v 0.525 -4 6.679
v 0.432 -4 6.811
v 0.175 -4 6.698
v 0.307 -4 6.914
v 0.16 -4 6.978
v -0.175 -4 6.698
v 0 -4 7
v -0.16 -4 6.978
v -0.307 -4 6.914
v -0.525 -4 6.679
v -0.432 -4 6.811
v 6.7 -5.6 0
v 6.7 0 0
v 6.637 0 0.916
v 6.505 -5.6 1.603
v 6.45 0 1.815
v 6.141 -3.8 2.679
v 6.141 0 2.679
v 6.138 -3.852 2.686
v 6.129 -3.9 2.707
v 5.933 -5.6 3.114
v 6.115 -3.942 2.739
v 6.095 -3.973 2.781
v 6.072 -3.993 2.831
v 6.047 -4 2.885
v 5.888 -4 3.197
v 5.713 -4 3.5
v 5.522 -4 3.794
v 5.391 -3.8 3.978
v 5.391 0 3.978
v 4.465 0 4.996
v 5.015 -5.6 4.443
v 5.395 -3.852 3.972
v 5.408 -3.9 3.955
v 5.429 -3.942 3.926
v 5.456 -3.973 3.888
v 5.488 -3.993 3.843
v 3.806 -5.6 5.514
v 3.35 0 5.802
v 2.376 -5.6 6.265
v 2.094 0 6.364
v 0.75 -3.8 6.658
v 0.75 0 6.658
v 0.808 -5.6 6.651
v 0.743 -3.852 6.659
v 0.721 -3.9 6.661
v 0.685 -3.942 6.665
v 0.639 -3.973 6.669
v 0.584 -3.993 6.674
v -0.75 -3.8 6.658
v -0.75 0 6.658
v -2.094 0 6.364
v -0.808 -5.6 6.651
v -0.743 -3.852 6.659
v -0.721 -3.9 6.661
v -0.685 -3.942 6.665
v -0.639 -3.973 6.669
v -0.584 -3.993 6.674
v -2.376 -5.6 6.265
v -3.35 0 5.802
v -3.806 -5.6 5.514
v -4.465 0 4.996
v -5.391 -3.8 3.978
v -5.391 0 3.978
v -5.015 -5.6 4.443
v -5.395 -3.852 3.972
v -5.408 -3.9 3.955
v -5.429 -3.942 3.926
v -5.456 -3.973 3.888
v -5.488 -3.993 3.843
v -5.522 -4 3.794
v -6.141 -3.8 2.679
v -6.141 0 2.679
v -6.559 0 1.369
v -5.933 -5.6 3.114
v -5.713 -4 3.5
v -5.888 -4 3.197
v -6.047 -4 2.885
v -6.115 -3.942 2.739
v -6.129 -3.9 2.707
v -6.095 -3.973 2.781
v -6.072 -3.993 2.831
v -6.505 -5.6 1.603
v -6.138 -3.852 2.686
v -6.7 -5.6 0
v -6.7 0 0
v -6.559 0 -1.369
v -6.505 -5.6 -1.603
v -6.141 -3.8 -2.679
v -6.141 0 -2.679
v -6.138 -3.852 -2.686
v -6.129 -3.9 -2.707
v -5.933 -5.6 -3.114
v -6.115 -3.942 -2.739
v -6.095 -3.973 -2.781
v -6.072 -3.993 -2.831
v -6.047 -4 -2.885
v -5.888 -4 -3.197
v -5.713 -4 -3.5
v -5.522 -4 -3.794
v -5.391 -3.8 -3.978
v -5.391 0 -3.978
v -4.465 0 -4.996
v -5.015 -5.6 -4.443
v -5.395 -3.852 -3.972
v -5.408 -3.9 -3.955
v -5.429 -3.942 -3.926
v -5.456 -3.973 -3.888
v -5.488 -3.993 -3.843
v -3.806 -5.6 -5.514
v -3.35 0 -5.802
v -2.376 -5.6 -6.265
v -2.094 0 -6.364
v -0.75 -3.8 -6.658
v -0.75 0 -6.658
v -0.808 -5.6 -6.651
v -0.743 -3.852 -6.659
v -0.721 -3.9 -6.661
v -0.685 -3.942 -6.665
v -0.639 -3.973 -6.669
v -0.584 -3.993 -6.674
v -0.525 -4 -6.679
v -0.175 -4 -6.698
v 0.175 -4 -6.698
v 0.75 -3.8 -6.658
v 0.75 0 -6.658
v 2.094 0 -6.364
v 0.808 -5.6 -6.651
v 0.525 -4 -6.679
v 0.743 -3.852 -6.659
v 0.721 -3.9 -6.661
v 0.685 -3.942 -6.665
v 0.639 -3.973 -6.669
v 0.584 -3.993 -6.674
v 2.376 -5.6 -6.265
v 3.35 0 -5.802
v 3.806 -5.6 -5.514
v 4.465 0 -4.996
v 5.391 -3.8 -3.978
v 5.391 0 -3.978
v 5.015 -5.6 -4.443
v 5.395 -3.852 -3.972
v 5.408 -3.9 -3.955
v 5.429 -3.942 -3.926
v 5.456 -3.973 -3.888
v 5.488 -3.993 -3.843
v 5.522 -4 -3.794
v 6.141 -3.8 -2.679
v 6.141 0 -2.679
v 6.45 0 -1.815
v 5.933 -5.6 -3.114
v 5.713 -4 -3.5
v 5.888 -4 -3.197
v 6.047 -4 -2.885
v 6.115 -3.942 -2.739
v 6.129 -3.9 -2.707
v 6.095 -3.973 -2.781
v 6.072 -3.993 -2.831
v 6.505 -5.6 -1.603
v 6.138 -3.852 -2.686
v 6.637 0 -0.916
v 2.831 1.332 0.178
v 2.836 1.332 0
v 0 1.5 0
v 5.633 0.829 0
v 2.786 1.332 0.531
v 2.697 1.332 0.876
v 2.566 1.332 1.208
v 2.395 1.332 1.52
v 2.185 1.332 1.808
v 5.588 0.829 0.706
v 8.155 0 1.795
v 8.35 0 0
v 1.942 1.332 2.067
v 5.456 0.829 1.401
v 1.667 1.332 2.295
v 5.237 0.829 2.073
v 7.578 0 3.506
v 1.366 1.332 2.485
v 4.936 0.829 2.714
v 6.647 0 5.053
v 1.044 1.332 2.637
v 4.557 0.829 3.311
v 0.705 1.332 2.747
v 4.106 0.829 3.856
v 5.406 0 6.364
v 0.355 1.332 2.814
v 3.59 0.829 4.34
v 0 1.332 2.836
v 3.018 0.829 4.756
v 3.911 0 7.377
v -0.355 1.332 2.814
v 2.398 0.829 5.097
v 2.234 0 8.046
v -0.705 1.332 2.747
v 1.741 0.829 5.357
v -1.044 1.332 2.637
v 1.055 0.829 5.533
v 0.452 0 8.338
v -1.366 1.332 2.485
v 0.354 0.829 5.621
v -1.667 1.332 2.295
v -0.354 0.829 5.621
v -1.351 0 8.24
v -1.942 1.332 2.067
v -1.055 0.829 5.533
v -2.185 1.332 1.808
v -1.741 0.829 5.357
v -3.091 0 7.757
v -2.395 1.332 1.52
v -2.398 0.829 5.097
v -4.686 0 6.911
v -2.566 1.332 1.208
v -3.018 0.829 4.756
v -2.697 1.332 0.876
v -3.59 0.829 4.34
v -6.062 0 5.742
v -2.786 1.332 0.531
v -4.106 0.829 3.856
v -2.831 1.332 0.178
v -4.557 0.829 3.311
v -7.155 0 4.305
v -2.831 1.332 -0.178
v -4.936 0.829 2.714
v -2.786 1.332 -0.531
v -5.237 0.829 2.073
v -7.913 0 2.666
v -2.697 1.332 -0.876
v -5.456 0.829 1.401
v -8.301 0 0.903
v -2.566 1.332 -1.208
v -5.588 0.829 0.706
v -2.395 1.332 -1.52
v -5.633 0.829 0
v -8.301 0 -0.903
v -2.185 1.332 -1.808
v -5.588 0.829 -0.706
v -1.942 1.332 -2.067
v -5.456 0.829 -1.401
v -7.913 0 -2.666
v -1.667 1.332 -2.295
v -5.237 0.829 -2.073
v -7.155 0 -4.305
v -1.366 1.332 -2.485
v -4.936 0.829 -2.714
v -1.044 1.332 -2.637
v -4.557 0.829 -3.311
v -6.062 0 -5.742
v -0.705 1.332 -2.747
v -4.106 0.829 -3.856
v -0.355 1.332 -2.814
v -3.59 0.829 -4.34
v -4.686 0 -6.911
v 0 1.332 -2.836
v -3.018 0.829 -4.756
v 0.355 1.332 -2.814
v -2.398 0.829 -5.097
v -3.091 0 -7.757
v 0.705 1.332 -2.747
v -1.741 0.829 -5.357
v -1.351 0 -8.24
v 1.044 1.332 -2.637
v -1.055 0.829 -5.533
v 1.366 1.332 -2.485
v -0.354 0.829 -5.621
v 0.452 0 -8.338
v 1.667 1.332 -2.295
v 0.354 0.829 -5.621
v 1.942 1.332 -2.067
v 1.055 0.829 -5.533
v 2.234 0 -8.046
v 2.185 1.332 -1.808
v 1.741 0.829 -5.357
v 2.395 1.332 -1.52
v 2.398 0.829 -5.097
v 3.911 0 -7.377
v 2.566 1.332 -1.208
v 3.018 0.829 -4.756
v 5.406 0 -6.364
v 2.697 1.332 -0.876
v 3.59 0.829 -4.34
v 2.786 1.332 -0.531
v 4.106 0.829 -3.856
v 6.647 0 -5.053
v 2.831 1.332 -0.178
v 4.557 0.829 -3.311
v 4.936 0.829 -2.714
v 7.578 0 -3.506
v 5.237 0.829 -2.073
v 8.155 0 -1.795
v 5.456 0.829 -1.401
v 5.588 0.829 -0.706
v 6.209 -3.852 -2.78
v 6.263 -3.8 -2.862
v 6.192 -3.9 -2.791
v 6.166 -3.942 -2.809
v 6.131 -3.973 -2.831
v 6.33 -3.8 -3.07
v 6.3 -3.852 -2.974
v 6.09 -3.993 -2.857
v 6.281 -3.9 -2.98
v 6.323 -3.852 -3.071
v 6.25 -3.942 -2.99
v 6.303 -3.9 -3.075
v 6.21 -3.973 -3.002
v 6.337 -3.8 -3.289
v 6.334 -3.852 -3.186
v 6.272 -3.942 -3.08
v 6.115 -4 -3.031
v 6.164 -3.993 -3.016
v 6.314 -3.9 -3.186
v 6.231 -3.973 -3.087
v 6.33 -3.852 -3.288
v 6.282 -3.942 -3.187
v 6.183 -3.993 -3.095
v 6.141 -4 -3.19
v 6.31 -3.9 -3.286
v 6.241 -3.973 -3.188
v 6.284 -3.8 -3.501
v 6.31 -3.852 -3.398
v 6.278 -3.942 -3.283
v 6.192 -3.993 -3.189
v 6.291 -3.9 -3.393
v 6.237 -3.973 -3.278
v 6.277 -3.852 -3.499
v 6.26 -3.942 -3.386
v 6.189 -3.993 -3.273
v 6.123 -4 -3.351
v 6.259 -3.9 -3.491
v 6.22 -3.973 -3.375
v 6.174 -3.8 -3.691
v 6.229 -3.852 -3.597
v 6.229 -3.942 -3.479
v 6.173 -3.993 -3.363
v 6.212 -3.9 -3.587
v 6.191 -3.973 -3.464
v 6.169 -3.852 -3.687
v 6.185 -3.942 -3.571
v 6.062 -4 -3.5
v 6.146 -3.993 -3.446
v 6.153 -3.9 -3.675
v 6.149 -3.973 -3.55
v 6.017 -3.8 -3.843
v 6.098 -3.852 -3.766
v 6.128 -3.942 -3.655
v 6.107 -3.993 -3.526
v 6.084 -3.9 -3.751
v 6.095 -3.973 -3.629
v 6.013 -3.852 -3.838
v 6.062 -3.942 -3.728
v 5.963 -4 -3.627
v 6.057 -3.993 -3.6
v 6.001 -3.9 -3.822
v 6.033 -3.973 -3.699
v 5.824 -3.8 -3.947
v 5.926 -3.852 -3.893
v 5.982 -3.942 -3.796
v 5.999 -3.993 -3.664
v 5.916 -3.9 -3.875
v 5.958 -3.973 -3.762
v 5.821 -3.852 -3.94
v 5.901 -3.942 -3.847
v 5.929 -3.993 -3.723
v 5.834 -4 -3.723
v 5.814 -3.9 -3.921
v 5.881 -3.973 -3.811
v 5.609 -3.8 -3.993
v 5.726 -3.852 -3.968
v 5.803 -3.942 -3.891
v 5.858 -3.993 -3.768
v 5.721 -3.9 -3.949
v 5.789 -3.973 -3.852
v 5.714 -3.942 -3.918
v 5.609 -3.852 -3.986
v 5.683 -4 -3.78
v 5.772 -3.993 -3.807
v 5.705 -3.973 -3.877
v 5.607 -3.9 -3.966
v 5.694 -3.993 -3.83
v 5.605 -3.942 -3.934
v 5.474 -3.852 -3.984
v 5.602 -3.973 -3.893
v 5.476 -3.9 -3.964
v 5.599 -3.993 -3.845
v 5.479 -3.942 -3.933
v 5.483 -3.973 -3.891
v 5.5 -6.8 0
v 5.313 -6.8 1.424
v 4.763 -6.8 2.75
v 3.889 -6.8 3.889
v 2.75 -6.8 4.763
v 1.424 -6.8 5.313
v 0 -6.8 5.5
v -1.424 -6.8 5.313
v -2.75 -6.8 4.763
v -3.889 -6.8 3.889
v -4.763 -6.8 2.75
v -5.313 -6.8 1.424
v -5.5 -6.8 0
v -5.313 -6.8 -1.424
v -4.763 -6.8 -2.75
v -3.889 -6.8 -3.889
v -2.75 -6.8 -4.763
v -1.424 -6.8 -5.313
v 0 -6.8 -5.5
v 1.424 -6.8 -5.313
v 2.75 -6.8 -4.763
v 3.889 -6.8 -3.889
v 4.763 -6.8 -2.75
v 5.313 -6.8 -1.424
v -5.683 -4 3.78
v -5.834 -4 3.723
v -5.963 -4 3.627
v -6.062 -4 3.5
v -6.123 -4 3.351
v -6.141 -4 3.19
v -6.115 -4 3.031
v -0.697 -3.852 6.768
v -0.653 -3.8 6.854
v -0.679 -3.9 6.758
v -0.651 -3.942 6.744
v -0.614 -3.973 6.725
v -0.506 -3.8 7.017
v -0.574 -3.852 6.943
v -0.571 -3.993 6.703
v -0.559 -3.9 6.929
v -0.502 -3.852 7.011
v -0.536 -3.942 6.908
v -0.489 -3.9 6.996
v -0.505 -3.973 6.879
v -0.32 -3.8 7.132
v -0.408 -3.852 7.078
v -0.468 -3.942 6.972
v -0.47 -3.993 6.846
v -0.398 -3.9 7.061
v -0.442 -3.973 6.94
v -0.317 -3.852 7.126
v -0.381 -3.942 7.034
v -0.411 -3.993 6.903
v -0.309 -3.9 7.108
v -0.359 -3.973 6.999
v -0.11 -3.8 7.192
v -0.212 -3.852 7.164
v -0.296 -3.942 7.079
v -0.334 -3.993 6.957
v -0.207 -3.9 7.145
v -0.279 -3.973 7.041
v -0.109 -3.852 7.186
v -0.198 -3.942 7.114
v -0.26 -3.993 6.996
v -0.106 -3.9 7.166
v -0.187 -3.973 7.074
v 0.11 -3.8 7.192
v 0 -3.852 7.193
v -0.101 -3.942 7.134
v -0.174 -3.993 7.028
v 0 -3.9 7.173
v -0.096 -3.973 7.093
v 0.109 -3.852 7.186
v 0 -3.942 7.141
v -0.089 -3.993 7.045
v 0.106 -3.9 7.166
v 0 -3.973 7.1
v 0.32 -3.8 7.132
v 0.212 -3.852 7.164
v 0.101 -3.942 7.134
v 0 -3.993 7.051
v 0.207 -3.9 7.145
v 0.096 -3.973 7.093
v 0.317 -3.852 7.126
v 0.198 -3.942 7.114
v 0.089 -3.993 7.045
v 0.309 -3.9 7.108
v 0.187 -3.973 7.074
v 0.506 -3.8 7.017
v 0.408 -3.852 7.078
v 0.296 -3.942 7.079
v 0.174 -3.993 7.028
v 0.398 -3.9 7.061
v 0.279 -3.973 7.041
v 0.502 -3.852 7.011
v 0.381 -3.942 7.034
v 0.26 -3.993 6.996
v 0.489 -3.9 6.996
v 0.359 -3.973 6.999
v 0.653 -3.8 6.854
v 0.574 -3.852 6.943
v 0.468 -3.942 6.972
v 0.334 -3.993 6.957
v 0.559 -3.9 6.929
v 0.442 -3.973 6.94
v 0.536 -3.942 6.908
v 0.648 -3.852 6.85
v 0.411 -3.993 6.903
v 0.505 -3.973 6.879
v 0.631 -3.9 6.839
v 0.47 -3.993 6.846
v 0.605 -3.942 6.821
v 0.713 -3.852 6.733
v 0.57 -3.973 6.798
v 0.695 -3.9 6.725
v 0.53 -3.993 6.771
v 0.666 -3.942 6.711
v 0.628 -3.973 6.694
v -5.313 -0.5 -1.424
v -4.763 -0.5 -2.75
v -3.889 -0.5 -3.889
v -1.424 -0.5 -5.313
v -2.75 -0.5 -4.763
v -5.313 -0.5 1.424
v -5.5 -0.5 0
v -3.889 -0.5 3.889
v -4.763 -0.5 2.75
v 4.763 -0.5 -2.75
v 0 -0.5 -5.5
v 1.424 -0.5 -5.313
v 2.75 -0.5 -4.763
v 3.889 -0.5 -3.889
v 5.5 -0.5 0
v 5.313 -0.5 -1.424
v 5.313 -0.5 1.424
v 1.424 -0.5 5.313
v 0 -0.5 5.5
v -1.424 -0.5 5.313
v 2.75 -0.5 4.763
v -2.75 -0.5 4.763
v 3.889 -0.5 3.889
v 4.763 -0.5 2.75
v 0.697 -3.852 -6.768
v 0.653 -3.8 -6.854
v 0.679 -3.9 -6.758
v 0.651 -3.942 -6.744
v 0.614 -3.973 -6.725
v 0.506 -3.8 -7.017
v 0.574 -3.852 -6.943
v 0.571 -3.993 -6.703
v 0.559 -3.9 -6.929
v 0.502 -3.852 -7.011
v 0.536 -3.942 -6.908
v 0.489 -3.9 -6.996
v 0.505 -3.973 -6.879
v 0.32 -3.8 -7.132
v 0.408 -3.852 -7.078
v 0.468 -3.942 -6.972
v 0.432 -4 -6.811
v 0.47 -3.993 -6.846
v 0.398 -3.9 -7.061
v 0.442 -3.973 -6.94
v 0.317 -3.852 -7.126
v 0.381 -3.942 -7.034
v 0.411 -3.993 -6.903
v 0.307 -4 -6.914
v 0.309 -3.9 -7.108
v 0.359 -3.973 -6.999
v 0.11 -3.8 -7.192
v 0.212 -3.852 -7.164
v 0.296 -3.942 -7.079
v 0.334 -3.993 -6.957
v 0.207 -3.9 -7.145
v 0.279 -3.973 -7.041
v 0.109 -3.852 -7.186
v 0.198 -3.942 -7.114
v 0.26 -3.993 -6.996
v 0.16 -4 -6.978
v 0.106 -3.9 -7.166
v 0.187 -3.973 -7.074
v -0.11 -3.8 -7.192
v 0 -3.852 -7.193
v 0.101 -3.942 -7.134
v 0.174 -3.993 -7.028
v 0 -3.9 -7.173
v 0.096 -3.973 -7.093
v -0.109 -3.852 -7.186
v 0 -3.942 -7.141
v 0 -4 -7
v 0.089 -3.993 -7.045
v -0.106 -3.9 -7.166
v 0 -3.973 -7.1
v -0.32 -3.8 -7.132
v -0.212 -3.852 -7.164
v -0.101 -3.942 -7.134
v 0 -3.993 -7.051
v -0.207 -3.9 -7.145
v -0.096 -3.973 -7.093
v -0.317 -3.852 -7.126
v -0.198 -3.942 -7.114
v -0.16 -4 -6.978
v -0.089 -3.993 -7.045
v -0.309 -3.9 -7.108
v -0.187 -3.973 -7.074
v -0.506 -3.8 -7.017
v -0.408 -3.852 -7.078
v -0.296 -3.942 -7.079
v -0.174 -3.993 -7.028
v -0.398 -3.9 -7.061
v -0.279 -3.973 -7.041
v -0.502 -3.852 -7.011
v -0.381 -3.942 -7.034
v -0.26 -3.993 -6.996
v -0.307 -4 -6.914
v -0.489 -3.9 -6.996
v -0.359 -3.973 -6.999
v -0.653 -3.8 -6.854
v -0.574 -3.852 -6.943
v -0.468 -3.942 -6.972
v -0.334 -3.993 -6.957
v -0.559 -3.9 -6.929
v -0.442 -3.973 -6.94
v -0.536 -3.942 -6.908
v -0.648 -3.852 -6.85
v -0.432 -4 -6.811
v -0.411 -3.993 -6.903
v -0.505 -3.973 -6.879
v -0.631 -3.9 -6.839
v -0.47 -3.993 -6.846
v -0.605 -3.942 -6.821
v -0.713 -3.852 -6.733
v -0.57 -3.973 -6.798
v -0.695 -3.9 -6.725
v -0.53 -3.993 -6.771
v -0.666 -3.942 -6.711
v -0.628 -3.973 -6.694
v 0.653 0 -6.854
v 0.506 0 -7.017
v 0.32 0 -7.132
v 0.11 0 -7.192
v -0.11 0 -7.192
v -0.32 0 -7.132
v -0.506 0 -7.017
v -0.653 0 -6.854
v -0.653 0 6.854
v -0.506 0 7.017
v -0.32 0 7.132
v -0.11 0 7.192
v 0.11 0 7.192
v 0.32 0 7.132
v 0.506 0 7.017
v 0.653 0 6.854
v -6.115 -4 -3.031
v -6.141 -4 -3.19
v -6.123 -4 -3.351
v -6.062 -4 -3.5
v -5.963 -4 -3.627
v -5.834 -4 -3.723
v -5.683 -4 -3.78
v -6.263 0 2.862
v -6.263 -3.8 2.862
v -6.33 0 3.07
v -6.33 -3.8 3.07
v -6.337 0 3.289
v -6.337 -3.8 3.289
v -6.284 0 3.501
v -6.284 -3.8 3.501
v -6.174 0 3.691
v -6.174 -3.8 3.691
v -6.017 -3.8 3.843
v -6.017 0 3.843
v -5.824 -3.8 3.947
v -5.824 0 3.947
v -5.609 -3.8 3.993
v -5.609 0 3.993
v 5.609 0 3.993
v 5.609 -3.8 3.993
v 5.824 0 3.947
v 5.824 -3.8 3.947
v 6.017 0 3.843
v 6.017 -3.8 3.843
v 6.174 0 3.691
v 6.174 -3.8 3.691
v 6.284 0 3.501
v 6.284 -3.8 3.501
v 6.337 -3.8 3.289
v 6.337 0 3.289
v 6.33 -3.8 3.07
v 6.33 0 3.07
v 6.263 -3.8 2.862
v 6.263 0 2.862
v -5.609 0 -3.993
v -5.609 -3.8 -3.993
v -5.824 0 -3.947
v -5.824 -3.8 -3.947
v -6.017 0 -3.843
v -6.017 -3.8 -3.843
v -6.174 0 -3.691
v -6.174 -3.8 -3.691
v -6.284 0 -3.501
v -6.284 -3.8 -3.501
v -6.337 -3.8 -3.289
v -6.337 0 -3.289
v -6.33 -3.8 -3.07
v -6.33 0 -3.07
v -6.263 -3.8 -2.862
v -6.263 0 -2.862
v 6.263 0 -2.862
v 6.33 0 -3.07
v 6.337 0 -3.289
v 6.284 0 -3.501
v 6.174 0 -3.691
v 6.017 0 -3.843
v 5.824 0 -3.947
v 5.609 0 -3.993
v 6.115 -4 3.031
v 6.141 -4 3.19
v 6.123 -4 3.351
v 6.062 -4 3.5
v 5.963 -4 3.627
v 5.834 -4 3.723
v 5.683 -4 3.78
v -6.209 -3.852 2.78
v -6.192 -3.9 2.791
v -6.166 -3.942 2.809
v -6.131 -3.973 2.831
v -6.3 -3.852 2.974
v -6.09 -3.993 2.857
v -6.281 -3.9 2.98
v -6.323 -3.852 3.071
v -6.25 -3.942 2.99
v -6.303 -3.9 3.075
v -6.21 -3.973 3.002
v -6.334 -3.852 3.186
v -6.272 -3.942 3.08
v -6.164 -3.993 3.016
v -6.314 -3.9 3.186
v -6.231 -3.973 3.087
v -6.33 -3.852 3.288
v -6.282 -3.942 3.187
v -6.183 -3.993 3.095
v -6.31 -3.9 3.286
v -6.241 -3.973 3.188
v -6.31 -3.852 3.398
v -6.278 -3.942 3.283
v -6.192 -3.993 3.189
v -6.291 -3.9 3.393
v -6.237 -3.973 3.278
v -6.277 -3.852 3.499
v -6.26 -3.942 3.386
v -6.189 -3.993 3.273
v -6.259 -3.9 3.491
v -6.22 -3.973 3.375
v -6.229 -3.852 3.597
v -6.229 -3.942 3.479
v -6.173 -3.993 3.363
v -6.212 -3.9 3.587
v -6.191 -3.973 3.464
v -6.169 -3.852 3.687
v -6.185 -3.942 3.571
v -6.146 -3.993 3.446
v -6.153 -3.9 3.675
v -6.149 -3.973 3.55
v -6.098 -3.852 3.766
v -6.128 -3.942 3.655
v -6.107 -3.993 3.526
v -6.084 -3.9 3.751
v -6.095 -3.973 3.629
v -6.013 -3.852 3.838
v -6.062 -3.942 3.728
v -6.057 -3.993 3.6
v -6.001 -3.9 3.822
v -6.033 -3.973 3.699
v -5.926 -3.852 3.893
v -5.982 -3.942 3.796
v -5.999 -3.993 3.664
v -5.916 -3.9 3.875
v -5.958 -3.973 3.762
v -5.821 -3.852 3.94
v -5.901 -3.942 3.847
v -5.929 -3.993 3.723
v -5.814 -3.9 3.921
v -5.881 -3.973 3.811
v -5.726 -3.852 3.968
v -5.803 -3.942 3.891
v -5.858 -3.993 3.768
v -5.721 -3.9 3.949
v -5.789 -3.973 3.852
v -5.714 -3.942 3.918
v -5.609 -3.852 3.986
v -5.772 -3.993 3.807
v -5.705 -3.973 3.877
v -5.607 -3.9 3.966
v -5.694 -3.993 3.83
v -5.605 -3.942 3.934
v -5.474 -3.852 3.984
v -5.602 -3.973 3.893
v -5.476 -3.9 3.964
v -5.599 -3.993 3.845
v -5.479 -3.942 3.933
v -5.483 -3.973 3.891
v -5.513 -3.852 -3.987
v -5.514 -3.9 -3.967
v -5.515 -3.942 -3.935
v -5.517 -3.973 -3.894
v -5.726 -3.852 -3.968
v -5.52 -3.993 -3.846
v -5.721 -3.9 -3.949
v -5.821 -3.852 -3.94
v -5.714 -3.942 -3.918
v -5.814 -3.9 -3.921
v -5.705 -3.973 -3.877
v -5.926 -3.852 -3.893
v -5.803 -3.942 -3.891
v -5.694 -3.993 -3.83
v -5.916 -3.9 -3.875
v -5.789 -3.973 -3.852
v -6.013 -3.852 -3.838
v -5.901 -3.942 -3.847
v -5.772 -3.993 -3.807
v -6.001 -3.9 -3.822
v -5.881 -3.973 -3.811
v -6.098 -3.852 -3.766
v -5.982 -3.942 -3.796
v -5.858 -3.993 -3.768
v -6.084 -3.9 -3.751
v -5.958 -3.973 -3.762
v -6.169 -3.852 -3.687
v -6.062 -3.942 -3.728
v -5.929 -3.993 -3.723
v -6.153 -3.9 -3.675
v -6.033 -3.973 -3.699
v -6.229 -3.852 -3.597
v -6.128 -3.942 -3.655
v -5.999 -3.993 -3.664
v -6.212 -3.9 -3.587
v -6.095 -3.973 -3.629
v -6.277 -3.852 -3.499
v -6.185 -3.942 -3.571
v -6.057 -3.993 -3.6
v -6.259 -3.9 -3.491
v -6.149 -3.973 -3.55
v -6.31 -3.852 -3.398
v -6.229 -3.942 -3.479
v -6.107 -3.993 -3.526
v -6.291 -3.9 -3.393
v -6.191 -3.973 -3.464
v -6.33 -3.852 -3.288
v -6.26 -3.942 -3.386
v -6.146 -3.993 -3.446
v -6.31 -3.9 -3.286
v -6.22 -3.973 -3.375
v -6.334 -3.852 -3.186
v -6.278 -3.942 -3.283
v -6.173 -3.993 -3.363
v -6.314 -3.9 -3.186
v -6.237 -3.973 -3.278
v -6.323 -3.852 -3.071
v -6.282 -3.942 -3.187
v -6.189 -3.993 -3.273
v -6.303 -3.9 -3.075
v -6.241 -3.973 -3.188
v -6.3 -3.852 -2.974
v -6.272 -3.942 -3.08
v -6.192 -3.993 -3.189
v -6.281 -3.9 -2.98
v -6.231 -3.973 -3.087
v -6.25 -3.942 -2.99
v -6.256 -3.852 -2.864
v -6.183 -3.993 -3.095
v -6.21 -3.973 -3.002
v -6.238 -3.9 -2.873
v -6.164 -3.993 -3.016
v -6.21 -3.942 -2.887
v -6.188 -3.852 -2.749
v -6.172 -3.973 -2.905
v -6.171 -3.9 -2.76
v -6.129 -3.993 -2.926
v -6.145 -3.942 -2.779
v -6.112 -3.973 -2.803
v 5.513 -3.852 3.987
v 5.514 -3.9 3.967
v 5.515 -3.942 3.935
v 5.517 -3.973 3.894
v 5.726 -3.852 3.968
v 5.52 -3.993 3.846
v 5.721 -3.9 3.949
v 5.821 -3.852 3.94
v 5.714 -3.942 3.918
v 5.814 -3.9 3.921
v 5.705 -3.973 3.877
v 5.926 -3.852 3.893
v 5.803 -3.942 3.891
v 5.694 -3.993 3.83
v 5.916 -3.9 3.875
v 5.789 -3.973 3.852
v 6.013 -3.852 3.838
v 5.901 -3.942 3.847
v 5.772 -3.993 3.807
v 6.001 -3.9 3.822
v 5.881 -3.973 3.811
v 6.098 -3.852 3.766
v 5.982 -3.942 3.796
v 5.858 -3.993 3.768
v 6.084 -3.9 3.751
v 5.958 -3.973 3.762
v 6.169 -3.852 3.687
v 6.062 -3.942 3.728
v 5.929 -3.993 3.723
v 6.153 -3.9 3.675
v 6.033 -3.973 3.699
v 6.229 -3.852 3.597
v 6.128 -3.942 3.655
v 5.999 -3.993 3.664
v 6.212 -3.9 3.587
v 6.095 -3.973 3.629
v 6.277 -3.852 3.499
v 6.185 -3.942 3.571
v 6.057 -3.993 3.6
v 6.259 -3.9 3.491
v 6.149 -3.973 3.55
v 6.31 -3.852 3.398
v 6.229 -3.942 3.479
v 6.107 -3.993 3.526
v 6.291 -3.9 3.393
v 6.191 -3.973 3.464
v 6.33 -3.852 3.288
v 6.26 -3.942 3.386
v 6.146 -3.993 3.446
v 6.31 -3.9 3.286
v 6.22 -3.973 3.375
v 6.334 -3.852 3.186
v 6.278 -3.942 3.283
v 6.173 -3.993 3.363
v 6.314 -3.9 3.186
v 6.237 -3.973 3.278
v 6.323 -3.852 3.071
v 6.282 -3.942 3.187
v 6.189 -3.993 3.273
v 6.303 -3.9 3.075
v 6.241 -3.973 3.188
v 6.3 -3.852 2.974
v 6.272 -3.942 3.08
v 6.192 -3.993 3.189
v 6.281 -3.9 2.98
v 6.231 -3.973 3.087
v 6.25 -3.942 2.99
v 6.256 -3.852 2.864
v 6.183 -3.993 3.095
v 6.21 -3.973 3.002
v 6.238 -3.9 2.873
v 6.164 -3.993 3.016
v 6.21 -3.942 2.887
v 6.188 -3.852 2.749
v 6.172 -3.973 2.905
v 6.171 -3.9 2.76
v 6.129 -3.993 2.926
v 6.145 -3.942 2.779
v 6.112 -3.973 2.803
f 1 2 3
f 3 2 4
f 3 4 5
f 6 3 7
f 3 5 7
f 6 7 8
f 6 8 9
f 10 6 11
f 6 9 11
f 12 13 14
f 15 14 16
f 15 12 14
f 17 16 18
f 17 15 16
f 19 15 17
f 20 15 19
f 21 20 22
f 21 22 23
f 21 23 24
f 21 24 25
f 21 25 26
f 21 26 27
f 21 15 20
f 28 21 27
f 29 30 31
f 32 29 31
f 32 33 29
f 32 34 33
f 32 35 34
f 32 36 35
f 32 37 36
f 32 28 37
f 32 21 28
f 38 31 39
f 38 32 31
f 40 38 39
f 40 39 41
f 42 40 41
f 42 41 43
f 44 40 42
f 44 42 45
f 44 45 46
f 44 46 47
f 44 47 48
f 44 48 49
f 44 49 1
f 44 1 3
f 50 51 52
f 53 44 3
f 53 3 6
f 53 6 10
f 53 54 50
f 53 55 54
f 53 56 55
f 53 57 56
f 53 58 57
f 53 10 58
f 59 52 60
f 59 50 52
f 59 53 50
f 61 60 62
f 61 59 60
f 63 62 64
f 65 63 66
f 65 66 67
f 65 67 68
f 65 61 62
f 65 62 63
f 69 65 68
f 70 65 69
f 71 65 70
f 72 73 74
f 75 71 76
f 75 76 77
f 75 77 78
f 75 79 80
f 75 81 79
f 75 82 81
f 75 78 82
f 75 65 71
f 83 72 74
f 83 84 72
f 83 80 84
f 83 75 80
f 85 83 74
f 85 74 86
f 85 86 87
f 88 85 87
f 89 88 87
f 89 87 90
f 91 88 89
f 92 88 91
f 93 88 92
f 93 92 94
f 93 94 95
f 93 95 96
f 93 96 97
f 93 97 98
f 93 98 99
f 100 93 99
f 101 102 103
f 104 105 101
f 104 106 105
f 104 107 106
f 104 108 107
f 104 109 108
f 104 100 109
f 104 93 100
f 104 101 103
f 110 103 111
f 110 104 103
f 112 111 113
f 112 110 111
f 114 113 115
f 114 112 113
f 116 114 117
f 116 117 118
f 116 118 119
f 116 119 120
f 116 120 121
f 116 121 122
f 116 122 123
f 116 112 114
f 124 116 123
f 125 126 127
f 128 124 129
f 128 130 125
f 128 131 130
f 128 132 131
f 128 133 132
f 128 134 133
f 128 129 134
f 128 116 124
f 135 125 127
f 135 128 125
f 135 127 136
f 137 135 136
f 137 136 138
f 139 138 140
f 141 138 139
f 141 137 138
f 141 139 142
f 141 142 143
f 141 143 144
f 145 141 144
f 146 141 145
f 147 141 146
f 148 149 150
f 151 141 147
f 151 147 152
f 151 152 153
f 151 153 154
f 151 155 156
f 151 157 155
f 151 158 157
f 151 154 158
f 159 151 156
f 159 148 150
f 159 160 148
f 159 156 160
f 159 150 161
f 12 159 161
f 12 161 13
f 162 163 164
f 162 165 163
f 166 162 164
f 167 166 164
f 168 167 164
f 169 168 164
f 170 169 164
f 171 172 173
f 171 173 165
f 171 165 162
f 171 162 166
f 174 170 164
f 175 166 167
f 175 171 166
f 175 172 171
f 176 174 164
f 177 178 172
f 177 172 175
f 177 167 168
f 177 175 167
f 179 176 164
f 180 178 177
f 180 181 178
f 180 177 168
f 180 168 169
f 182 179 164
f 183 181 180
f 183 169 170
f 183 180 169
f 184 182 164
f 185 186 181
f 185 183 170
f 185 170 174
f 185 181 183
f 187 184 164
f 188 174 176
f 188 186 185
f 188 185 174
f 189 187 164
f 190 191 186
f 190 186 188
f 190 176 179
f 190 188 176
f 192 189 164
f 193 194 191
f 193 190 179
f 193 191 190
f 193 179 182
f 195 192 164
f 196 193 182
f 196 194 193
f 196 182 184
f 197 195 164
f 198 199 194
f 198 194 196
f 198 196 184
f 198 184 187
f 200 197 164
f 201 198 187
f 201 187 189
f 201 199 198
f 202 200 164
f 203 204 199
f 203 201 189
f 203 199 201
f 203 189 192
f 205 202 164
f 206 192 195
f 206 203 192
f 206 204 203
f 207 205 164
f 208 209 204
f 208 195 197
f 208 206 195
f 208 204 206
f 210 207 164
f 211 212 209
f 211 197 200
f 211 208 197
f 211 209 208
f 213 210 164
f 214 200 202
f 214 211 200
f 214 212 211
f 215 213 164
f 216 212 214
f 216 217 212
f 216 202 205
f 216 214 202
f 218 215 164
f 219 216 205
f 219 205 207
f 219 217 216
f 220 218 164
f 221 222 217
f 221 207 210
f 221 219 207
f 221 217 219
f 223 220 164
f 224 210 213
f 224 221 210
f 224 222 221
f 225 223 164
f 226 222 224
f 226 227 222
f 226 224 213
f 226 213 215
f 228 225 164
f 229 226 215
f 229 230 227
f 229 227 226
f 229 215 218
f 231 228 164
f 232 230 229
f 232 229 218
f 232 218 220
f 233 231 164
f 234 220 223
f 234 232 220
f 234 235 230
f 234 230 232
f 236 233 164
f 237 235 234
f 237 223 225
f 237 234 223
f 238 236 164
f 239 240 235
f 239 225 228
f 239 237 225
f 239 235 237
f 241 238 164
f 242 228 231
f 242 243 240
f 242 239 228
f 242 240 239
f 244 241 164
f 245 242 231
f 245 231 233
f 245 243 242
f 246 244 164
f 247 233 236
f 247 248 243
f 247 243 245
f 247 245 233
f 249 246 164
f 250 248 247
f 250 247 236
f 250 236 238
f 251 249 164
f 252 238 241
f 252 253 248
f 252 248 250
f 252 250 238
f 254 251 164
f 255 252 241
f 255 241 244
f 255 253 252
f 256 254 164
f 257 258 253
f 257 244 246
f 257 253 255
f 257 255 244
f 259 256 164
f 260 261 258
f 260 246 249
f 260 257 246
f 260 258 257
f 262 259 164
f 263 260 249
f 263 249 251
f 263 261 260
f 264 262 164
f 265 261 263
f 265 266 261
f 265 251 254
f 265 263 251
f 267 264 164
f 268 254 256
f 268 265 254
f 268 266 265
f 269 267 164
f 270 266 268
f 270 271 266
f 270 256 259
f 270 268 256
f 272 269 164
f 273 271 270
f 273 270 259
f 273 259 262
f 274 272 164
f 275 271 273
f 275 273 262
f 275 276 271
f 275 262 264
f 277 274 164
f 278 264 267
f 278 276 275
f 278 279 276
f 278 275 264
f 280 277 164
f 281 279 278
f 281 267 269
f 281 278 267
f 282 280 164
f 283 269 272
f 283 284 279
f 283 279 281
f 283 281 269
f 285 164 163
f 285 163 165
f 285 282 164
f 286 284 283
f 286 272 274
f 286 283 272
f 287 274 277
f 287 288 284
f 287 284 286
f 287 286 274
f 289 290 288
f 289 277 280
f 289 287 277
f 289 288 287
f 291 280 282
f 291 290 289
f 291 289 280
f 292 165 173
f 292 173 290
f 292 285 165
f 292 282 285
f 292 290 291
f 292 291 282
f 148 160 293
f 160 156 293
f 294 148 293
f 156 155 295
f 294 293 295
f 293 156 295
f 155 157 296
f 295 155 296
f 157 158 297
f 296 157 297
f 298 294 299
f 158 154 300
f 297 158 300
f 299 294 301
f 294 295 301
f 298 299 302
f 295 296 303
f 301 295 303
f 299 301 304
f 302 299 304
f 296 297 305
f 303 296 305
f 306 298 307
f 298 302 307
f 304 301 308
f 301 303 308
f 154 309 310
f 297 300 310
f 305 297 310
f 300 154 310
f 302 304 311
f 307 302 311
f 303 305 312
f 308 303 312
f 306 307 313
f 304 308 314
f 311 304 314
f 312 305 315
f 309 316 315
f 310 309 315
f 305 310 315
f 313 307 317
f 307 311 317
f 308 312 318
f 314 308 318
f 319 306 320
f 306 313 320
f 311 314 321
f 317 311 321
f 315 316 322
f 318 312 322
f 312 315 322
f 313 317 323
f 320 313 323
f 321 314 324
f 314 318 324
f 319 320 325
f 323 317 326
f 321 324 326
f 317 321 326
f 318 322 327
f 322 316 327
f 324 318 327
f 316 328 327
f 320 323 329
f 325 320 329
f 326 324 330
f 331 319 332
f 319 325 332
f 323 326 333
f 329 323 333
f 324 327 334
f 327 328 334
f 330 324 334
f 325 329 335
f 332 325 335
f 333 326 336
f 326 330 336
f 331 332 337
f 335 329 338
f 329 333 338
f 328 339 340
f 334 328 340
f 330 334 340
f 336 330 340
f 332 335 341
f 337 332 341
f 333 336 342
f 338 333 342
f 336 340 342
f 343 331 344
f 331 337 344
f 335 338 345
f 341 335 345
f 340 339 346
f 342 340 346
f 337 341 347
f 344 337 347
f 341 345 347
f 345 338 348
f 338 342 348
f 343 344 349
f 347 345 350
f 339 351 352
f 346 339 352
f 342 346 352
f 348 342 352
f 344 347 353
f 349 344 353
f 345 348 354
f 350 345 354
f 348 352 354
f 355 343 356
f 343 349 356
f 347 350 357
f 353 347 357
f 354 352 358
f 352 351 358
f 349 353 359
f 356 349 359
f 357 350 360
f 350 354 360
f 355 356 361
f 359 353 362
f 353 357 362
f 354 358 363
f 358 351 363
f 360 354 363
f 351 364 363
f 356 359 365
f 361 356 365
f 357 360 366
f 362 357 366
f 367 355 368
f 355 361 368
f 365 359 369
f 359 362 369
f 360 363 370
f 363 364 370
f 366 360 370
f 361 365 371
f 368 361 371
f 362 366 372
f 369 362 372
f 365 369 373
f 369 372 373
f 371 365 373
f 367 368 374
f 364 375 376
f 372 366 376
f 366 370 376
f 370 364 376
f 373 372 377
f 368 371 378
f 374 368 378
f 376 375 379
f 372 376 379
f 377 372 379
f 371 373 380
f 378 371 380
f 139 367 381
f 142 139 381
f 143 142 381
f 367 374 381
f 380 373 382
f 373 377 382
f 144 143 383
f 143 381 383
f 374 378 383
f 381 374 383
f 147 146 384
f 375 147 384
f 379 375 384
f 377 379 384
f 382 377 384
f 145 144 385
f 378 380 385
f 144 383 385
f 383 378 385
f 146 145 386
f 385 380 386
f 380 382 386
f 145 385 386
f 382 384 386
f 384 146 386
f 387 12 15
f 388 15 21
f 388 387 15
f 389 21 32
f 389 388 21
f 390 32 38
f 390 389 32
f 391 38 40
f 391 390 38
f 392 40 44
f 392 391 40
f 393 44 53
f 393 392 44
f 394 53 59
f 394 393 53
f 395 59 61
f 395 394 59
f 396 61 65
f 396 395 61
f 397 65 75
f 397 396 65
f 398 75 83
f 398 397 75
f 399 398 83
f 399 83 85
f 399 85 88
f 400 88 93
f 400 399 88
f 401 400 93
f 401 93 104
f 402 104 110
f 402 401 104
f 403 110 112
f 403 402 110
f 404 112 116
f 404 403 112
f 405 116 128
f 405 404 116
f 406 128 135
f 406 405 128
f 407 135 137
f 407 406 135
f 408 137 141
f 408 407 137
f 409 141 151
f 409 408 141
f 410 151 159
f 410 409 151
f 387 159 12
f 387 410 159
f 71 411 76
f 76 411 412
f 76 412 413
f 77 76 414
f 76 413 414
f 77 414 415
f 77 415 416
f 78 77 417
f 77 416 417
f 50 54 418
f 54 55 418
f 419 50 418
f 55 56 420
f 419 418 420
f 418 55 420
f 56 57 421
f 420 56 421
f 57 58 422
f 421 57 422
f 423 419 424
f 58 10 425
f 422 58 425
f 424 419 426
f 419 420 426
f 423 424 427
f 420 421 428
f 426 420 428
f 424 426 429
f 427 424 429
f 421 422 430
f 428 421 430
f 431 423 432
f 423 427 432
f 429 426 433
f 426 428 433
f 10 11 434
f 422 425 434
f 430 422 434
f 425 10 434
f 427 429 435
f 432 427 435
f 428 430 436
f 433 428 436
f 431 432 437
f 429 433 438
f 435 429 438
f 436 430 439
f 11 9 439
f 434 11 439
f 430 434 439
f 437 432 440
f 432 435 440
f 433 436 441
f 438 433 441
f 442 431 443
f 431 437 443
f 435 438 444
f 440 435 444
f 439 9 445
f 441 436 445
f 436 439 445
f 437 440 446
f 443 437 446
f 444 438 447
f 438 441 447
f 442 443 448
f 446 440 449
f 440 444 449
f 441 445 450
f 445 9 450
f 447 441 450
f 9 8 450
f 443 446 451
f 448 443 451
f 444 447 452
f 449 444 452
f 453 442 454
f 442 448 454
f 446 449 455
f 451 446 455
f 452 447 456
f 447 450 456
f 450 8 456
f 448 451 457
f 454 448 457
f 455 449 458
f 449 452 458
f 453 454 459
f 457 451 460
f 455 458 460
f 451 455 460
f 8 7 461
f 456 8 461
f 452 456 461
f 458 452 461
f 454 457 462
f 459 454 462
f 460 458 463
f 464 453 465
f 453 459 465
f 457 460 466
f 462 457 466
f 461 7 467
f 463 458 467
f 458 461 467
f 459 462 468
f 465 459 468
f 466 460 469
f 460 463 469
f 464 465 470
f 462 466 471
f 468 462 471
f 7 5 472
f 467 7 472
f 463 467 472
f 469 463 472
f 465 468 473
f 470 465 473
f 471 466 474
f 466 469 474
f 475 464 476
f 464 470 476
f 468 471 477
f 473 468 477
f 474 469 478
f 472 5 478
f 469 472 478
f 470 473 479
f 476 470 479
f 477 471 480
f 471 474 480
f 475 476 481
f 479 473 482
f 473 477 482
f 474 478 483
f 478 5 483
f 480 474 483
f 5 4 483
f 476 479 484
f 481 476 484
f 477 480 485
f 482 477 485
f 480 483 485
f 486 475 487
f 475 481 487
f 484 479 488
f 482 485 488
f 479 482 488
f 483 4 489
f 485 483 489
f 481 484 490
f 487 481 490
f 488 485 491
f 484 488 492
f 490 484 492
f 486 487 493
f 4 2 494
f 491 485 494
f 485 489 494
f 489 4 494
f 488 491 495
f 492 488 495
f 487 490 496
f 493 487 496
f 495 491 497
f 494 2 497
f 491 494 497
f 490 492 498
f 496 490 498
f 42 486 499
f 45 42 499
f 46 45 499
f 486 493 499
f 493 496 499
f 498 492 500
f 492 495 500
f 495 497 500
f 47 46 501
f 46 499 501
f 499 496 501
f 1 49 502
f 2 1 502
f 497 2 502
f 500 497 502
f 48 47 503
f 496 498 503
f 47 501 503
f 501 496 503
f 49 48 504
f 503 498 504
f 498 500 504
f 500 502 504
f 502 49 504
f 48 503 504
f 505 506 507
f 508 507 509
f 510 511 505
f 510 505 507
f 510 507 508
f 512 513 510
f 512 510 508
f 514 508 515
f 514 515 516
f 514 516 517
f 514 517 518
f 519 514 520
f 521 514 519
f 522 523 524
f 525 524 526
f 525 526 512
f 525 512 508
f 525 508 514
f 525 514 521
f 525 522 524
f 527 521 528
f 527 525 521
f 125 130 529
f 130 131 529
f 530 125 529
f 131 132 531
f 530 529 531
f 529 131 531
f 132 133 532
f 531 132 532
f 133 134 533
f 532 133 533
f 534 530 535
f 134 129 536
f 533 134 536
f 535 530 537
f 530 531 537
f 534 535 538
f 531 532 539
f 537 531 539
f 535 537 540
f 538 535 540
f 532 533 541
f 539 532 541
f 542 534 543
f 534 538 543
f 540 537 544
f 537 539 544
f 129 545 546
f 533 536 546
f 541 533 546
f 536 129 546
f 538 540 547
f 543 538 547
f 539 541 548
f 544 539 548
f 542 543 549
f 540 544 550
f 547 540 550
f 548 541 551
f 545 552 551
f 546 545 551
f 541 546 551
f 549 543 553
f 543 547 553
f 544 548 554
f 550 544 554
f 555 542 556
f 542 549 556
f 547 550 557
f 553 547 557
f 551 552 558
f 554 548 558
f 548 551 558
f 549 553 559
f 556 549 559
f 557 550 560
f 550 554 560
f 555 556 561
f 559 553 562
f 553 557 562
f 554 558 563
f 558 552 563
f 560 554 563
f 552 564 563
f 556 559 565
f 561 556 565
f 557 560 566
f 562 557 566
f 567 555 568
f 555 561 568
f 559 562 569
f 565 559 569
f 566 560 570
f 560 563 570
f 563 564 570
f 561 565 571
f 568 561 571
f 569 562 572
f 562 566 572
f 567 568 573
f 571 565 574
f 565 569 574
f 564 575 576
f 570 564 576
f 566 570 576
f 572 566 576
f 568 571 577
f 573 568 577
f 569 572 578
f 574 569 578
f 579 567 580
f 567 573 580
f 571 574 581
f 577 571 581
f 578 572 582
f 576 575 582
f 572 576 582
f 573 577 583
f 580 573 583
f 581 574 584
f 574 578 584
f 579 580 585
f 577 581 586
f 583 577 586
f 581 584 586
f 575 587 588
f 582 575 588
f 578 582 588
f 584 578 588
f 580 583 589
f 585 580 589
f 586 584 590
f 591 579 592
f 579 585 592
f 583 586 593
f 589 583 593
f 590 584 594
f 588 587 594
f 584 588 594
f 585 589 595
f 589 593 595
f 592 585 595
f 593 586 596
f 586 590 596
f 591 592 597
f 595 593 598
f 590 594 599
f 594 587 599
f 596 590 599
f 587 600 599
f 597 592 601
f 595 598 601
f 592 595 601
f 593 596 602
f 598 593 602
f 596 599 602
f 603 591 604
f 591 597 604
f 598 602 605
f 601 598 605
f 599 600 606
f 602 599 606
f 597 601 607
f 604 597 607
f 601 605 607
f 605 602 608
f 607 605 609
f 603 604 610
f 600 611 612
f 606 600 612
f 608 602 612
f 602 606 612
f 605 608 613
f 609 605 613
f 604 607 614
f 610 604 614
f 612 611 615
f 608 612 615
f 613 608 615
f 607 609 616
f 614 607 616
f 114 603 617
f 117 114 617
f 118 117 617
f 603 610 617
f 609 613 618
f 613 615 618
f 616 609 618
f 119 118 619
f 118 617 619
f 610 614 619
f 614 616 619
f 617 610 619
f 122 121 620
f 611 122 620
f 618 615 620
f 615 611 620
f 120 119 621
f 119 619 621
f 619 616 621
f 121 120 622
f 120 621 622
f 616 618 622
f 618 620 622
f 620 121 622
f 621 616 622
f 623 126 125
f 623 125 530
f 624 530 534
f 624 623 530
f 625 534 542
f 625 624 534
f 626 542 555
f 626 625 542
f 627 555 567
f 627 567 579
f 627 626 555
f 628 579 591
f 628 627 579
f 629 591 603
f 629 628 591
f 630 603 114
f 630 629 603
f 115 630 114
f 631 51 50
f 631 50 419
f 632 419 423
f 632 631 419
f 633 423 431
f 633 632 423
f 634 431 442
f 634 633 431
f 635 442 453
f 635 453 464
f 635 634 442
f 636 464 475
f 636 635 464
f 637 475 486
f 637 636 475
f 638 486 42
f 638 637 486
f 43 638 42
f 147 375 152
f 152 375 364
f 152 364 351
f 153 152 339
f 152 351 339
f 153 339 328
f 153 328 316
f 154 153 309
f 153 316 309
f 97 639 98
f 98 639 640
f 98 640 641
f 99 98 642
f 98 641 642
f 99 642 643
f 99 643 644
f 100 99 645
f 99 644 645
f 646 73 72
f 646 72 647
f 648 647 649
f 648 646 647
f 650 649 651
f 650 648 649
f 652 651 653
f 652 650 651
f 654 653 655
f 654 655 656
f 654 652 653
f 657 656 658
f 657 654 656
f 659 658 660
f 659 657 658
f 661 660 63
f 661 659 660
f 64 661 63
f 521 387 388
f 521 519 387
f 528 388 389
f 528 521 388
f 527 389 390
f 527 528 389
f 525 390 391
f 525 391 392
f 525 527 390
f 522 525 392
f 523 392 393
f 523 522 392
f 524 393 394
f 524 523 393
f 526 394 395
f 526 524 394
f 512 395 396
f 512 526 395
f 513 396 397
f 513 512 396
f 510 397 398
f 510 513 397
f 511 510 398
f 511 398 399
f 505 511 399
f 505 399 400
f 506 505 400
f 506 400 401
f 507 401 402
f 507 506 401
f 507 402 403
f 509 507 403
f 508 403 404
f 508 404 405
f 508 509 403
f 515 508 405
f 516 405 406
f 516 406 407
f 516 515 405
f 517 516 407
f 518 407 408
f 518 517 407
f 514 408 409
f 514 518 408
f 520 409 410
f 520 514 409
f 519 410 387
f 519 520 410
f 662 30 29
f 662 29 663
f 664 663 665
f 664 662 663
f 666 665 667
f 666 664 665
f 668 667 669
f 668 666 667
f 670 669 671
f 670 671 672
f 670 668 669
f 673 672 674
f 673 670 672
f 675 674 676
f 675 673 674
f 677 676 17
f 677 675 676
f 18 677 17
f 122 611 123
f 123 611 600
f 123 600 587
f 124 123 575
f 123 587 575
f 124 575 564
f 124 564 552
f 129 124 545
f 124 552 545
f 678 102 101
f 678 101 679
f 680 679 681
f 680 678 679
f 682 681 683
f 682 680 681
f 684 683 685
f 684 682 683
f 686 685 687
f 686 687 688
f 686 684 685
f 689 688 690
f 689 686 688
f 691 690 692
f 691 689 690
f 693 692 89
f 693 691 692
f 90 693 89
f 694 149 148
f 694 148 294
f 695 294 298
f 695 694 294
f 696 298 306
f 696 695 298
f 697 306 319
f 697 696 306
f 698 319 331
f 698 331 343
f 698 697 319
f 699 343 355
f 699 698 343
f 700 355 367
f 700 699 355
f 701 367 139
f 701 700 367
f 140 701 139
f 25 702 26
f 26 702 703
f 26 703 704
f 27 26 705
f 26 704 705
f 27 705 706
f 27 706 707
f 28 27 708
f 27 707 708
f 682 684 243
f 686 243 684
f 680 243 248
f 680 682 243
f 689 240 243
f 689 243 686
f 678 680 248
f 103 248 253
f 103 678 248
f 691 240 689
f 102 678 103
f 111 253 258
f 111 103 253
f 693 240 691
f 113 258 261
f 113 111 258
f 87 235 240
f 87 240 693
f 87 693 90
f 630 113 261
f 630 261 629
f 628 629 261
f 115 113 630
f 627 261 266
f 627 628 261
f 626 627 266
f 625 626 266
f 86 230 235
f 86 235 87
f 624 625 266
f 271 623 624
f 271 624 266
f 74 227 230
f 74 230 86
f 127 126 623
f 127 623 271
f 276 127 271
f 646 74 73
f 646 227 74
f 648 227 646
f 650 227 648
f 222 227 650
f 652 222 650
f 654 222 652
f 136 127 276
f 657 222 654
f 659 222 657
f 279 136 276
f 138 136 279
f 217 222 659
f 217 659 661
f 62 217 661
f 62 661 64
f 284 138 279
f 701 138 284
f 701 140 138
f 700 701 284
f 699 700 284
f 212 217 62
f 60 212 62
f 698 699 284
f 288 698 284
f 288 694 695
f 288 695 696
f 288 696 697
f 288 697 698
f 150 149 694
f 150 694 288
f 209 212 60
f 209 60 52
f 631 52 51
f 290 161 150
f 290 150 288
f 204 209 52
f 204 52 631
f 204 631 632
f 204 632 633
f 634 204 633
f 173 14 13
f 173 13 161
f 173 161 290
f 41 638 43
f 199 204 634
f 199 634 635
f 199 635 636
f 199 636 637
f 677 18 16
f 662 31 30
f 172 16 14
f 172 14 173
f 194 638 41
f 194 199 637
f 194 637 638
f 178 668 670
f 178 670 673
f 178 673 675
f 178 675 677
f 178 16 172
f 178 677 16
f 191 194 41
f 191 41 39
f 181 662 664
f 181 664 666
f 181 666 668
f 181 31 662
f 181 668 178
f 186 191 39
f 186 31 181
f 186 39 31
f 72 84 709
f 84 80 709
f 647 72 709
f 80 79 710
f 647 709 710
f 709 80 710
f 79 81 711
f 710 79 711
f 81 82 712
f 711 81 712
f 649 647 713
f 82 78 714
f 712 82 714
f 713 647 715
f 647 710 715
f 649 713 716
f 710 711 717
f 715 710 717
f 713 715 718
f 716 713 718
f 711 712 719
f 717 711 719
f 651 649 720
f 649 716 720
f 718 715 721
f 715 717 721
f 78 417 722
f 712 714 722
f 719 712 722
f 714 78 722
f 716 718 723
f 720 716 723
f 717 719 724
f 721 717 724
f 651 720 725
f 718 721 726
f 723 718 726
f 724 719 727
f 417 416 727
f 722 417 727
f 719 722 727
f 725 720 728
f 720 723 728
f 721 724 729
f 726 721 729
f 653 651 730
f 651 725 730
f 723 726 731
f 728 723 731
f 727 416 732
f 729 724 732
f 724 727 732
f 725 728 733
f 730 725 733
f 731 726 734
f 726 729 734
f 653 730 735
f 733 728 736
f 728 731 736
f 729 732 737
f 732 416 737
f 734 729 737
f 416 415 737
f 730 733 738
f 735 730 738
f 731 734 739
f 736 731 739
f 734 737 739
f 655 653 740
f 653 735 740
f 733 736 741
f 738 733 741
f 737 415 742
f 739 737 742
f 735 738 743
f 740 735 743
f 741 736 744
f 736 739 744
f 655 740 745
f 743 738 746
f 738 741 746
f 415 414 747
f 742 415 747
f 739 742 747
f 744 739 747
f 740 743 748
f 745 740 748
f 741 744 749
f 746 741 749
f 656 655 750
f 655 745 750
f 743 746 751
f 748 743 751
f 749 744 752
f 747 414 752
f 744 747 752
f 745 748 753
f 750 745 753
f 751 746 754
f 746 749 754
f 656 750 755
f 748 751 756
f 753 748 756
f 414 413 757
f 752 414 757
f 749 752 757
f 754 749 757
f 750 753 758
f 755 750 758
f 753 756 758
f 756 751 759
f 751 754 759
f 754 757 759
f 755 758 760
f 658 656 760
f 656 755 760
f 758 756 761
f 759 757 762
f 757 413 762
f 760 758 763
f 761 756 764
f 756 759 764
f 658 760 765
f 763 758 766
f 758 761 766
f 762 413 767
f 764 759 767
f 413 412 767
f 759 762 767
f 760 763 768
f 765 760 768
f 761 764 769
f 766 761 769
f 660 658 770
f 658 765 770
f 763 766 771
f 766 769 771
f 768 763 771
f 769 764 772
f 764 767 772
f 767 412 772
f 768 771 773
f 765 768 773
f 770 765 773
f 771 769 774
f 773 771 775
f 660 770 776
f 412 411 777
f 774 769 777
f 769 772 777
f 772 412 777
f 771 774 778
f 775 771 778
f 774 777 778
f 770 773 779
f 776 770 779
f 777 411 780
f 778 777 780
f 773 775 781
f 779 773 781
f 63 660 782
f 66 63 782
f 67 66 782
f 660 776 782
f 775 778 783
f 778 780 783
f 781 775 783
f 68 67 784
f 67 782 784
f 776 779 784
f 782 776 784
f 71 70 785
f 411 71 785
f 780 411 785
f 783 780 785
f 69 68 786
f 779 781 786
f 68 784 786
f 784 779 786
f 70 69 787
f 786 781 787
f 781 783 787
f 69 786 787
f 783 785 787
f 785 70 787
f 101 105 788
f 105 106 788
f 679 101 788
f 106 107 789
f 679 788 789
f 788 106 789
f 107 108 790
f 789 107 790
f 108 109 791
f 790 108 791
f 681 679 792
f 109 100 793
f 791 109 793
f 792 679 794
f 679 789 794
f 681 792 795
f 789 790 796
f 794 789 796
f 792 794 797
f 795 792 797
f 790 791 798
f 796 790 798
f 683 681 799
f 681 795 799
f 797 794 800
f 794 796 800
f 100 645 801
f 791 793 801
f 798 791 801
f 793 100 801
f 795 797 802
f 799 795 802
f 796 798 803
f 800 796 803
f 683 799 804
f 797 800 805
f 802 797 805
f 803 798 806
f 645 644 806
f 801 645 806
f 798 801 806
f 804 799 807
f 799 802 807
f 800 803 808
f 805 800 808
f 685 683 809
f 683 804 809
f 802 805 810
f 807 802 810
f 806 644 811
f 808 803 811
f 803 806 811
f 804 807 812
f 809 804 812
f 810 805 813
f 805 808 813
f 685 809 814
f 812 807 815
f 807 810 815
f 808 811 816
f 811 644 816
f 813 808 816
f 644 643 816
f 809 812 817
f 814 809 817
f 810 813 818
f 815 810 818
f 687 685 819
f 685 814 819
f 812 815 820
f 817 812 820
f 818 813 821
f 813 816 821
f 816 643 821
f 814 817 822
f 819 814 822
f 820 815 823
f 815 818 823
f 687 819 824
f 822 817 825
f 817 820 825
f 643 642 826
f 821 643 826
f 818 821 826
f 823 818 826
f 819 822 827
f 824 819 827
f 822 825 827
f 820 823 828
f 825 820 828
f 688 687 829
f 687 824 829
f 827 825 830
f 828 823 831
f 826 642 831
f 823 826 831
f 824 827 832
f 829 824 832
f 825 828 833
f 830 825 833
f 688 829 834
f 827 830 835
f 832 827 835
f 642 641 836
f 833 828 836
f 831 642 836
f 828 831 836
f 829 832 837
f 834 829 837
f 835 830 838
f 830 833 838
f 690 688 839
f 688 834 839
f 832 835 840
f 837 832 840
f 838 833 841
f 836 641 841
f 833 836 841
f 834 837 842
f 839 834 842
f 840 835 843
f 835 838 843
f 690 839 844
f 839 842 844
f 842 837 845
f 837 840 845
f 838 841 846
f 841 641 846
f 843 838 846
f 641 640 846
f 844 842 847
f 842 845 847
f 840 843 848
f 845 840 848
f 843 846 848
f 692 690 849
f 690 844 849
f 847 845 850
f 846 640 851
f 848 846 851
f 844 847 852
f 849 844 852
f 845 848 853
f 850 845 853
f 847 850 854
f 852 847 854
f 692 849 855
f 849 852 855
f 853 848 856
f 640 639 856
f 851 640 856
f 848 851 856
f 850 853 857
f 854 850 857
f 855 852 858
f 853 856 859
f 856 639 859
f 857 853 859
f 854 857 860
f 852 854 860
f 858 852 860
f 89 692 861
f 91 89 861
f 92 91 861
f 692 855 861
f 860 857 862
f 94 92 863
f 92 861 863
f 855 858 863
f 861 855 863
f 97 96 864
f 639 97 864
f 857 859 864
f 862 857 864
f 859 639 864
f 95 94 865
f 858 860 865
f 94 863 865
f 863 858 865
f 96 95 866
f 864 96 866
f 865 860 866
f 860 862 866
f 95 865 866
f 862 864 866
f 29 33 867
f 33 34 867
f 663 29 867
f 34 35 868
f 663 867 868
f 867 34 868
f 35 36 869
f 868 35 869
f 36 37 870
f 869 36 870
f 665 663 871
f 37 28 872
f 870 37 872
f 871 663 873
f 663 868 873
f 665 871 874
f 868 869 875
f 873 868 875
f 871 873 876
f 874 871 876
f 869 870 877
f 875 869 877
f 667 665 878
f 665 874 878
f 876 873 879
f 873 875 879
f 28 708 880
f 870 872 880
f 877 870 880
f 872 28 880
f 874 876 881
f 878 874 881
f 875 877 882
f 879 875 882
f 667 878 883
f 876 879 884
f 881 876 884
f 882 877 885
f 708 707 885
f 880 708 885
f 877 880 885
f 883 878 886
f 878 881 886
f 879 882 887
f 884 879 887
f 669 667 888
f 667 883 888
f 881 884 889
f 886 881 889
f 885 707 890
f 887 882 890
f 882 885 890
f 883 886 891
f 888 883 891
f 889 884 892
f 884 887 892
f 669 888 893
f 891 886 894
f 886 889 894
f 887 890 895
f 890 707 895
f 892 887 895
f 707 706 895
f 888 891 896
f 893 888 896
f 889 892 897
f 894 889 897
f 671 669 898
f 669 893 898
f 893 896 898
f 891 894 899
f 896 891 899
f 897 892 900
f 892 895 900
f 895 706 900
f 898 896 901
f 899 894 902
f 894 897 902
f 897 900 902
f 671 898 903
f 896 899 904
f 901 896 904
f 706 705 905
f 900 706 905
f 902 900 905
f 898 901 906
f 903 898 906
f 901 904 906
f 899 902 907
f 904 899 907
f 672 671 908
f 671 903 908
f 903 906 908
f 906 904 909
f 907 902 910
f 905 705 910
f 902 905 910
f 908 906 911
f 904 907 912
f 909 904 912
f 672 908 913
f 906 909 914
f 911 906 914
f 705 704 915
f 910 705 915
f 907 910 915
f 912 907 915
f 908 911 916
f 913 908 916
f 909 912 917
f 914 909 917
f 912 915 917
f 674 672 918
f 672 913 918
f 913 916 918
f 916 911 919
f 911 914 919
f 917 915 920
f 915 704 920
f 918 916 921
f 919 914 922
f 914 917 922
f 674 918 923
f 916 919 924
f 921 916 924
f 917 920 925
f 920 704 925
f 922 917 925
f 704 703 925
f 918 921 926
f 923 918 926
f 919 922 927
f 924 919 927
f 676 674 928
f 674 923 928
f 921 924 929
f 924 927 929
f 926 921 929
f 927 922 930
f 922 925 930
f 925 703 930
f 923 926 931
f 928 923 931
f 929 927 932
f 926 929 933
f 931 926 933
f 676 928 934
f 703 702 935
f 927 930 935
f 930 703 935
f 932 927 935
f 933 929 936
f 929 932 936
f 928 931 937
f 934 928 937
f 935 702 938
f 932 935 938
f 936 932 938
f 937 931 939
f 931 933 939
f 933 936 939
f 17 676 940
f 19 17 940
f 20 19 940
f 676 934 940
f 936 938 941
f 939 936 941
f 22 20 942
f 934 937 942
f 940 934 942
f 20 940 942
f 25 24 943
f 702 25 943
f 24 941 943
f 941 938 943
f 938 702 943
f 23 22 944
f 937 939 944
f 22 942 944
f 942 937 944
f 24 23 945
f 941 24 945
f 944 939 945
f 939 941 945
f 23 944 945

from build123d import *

# Parameters (mm, degrees)
EXTRUDE_1_DEPTH          = 4
PATTERN_CIRCULAR_1_COUNT = 6
FILLET_1_R               = 0.2


with BuildPart() as part:
    # Эскиз1 → Повернуть1 (revolve)
    with BuildSketch(Plane.XY):
        with BuildLine():
            Line((8.35, 0), (6.7, 0))
            Line((6.7, 0), (6.7, -5.6))
            Line((6.7, -5.6), (5.5, -6.8))
            Line((5.5, -6.8), (5.5, -0.5))
            Line((5.5, -0.5), (0, -0.5))
            Line((0, -0.5), (0, 1.5))
            ThreePointArc((0, 1.5), (4.241830383, 1.122022467), (8.35, 0))
        make_face()
    revolve(axis=Axis((0, -0.5, 0), (0, -1, 0)))

    # Эскиз2 → Бобышка-Вытянуть1 (add)
    with BuildSketch(Plane.XZ):
        with BuildLine():
            ThreePointArc((-0.75, 6.657890056), (0, 7.2), (0.75, 6.657890056))
            ThreePointArc((0.75, 6.657890056), (0, 6.7), (-0.75, 6.657890056))
        make_face()
    extrude_1 = extrude(amount=EXTRUDE_1_DEPTH)

    # Круговой массив1: Бобышка-Вытянуть1 ×6 about axis
    pattern_circular_1_axis = Axis((0, 0, 0), (0, 1, 0))
    for i in range(1, PATTERN_CIRCULAR_1_COUNT):
        add(extrude_1.rotate(pattern_circular_1_axis, i * 360 / PATTERN_CIRCULAR_1_COUNT))

    # Скругление1
    fillet_1_edges = [part.edges().sort_by_distance(p)[0] for p in [
        (0, -4, 7.2),
        (6.235382907, -4, 3.6),
        (6.235382907, -4, -3.6),
        (0, -4, -7.2),
        (-6.235382907, -4, -3.6),
        (-6.235382907, -4, 3.6),
    ]]
    fillet(fillet_1_edges, radius=FILLET_1_R)


solid = part.part
